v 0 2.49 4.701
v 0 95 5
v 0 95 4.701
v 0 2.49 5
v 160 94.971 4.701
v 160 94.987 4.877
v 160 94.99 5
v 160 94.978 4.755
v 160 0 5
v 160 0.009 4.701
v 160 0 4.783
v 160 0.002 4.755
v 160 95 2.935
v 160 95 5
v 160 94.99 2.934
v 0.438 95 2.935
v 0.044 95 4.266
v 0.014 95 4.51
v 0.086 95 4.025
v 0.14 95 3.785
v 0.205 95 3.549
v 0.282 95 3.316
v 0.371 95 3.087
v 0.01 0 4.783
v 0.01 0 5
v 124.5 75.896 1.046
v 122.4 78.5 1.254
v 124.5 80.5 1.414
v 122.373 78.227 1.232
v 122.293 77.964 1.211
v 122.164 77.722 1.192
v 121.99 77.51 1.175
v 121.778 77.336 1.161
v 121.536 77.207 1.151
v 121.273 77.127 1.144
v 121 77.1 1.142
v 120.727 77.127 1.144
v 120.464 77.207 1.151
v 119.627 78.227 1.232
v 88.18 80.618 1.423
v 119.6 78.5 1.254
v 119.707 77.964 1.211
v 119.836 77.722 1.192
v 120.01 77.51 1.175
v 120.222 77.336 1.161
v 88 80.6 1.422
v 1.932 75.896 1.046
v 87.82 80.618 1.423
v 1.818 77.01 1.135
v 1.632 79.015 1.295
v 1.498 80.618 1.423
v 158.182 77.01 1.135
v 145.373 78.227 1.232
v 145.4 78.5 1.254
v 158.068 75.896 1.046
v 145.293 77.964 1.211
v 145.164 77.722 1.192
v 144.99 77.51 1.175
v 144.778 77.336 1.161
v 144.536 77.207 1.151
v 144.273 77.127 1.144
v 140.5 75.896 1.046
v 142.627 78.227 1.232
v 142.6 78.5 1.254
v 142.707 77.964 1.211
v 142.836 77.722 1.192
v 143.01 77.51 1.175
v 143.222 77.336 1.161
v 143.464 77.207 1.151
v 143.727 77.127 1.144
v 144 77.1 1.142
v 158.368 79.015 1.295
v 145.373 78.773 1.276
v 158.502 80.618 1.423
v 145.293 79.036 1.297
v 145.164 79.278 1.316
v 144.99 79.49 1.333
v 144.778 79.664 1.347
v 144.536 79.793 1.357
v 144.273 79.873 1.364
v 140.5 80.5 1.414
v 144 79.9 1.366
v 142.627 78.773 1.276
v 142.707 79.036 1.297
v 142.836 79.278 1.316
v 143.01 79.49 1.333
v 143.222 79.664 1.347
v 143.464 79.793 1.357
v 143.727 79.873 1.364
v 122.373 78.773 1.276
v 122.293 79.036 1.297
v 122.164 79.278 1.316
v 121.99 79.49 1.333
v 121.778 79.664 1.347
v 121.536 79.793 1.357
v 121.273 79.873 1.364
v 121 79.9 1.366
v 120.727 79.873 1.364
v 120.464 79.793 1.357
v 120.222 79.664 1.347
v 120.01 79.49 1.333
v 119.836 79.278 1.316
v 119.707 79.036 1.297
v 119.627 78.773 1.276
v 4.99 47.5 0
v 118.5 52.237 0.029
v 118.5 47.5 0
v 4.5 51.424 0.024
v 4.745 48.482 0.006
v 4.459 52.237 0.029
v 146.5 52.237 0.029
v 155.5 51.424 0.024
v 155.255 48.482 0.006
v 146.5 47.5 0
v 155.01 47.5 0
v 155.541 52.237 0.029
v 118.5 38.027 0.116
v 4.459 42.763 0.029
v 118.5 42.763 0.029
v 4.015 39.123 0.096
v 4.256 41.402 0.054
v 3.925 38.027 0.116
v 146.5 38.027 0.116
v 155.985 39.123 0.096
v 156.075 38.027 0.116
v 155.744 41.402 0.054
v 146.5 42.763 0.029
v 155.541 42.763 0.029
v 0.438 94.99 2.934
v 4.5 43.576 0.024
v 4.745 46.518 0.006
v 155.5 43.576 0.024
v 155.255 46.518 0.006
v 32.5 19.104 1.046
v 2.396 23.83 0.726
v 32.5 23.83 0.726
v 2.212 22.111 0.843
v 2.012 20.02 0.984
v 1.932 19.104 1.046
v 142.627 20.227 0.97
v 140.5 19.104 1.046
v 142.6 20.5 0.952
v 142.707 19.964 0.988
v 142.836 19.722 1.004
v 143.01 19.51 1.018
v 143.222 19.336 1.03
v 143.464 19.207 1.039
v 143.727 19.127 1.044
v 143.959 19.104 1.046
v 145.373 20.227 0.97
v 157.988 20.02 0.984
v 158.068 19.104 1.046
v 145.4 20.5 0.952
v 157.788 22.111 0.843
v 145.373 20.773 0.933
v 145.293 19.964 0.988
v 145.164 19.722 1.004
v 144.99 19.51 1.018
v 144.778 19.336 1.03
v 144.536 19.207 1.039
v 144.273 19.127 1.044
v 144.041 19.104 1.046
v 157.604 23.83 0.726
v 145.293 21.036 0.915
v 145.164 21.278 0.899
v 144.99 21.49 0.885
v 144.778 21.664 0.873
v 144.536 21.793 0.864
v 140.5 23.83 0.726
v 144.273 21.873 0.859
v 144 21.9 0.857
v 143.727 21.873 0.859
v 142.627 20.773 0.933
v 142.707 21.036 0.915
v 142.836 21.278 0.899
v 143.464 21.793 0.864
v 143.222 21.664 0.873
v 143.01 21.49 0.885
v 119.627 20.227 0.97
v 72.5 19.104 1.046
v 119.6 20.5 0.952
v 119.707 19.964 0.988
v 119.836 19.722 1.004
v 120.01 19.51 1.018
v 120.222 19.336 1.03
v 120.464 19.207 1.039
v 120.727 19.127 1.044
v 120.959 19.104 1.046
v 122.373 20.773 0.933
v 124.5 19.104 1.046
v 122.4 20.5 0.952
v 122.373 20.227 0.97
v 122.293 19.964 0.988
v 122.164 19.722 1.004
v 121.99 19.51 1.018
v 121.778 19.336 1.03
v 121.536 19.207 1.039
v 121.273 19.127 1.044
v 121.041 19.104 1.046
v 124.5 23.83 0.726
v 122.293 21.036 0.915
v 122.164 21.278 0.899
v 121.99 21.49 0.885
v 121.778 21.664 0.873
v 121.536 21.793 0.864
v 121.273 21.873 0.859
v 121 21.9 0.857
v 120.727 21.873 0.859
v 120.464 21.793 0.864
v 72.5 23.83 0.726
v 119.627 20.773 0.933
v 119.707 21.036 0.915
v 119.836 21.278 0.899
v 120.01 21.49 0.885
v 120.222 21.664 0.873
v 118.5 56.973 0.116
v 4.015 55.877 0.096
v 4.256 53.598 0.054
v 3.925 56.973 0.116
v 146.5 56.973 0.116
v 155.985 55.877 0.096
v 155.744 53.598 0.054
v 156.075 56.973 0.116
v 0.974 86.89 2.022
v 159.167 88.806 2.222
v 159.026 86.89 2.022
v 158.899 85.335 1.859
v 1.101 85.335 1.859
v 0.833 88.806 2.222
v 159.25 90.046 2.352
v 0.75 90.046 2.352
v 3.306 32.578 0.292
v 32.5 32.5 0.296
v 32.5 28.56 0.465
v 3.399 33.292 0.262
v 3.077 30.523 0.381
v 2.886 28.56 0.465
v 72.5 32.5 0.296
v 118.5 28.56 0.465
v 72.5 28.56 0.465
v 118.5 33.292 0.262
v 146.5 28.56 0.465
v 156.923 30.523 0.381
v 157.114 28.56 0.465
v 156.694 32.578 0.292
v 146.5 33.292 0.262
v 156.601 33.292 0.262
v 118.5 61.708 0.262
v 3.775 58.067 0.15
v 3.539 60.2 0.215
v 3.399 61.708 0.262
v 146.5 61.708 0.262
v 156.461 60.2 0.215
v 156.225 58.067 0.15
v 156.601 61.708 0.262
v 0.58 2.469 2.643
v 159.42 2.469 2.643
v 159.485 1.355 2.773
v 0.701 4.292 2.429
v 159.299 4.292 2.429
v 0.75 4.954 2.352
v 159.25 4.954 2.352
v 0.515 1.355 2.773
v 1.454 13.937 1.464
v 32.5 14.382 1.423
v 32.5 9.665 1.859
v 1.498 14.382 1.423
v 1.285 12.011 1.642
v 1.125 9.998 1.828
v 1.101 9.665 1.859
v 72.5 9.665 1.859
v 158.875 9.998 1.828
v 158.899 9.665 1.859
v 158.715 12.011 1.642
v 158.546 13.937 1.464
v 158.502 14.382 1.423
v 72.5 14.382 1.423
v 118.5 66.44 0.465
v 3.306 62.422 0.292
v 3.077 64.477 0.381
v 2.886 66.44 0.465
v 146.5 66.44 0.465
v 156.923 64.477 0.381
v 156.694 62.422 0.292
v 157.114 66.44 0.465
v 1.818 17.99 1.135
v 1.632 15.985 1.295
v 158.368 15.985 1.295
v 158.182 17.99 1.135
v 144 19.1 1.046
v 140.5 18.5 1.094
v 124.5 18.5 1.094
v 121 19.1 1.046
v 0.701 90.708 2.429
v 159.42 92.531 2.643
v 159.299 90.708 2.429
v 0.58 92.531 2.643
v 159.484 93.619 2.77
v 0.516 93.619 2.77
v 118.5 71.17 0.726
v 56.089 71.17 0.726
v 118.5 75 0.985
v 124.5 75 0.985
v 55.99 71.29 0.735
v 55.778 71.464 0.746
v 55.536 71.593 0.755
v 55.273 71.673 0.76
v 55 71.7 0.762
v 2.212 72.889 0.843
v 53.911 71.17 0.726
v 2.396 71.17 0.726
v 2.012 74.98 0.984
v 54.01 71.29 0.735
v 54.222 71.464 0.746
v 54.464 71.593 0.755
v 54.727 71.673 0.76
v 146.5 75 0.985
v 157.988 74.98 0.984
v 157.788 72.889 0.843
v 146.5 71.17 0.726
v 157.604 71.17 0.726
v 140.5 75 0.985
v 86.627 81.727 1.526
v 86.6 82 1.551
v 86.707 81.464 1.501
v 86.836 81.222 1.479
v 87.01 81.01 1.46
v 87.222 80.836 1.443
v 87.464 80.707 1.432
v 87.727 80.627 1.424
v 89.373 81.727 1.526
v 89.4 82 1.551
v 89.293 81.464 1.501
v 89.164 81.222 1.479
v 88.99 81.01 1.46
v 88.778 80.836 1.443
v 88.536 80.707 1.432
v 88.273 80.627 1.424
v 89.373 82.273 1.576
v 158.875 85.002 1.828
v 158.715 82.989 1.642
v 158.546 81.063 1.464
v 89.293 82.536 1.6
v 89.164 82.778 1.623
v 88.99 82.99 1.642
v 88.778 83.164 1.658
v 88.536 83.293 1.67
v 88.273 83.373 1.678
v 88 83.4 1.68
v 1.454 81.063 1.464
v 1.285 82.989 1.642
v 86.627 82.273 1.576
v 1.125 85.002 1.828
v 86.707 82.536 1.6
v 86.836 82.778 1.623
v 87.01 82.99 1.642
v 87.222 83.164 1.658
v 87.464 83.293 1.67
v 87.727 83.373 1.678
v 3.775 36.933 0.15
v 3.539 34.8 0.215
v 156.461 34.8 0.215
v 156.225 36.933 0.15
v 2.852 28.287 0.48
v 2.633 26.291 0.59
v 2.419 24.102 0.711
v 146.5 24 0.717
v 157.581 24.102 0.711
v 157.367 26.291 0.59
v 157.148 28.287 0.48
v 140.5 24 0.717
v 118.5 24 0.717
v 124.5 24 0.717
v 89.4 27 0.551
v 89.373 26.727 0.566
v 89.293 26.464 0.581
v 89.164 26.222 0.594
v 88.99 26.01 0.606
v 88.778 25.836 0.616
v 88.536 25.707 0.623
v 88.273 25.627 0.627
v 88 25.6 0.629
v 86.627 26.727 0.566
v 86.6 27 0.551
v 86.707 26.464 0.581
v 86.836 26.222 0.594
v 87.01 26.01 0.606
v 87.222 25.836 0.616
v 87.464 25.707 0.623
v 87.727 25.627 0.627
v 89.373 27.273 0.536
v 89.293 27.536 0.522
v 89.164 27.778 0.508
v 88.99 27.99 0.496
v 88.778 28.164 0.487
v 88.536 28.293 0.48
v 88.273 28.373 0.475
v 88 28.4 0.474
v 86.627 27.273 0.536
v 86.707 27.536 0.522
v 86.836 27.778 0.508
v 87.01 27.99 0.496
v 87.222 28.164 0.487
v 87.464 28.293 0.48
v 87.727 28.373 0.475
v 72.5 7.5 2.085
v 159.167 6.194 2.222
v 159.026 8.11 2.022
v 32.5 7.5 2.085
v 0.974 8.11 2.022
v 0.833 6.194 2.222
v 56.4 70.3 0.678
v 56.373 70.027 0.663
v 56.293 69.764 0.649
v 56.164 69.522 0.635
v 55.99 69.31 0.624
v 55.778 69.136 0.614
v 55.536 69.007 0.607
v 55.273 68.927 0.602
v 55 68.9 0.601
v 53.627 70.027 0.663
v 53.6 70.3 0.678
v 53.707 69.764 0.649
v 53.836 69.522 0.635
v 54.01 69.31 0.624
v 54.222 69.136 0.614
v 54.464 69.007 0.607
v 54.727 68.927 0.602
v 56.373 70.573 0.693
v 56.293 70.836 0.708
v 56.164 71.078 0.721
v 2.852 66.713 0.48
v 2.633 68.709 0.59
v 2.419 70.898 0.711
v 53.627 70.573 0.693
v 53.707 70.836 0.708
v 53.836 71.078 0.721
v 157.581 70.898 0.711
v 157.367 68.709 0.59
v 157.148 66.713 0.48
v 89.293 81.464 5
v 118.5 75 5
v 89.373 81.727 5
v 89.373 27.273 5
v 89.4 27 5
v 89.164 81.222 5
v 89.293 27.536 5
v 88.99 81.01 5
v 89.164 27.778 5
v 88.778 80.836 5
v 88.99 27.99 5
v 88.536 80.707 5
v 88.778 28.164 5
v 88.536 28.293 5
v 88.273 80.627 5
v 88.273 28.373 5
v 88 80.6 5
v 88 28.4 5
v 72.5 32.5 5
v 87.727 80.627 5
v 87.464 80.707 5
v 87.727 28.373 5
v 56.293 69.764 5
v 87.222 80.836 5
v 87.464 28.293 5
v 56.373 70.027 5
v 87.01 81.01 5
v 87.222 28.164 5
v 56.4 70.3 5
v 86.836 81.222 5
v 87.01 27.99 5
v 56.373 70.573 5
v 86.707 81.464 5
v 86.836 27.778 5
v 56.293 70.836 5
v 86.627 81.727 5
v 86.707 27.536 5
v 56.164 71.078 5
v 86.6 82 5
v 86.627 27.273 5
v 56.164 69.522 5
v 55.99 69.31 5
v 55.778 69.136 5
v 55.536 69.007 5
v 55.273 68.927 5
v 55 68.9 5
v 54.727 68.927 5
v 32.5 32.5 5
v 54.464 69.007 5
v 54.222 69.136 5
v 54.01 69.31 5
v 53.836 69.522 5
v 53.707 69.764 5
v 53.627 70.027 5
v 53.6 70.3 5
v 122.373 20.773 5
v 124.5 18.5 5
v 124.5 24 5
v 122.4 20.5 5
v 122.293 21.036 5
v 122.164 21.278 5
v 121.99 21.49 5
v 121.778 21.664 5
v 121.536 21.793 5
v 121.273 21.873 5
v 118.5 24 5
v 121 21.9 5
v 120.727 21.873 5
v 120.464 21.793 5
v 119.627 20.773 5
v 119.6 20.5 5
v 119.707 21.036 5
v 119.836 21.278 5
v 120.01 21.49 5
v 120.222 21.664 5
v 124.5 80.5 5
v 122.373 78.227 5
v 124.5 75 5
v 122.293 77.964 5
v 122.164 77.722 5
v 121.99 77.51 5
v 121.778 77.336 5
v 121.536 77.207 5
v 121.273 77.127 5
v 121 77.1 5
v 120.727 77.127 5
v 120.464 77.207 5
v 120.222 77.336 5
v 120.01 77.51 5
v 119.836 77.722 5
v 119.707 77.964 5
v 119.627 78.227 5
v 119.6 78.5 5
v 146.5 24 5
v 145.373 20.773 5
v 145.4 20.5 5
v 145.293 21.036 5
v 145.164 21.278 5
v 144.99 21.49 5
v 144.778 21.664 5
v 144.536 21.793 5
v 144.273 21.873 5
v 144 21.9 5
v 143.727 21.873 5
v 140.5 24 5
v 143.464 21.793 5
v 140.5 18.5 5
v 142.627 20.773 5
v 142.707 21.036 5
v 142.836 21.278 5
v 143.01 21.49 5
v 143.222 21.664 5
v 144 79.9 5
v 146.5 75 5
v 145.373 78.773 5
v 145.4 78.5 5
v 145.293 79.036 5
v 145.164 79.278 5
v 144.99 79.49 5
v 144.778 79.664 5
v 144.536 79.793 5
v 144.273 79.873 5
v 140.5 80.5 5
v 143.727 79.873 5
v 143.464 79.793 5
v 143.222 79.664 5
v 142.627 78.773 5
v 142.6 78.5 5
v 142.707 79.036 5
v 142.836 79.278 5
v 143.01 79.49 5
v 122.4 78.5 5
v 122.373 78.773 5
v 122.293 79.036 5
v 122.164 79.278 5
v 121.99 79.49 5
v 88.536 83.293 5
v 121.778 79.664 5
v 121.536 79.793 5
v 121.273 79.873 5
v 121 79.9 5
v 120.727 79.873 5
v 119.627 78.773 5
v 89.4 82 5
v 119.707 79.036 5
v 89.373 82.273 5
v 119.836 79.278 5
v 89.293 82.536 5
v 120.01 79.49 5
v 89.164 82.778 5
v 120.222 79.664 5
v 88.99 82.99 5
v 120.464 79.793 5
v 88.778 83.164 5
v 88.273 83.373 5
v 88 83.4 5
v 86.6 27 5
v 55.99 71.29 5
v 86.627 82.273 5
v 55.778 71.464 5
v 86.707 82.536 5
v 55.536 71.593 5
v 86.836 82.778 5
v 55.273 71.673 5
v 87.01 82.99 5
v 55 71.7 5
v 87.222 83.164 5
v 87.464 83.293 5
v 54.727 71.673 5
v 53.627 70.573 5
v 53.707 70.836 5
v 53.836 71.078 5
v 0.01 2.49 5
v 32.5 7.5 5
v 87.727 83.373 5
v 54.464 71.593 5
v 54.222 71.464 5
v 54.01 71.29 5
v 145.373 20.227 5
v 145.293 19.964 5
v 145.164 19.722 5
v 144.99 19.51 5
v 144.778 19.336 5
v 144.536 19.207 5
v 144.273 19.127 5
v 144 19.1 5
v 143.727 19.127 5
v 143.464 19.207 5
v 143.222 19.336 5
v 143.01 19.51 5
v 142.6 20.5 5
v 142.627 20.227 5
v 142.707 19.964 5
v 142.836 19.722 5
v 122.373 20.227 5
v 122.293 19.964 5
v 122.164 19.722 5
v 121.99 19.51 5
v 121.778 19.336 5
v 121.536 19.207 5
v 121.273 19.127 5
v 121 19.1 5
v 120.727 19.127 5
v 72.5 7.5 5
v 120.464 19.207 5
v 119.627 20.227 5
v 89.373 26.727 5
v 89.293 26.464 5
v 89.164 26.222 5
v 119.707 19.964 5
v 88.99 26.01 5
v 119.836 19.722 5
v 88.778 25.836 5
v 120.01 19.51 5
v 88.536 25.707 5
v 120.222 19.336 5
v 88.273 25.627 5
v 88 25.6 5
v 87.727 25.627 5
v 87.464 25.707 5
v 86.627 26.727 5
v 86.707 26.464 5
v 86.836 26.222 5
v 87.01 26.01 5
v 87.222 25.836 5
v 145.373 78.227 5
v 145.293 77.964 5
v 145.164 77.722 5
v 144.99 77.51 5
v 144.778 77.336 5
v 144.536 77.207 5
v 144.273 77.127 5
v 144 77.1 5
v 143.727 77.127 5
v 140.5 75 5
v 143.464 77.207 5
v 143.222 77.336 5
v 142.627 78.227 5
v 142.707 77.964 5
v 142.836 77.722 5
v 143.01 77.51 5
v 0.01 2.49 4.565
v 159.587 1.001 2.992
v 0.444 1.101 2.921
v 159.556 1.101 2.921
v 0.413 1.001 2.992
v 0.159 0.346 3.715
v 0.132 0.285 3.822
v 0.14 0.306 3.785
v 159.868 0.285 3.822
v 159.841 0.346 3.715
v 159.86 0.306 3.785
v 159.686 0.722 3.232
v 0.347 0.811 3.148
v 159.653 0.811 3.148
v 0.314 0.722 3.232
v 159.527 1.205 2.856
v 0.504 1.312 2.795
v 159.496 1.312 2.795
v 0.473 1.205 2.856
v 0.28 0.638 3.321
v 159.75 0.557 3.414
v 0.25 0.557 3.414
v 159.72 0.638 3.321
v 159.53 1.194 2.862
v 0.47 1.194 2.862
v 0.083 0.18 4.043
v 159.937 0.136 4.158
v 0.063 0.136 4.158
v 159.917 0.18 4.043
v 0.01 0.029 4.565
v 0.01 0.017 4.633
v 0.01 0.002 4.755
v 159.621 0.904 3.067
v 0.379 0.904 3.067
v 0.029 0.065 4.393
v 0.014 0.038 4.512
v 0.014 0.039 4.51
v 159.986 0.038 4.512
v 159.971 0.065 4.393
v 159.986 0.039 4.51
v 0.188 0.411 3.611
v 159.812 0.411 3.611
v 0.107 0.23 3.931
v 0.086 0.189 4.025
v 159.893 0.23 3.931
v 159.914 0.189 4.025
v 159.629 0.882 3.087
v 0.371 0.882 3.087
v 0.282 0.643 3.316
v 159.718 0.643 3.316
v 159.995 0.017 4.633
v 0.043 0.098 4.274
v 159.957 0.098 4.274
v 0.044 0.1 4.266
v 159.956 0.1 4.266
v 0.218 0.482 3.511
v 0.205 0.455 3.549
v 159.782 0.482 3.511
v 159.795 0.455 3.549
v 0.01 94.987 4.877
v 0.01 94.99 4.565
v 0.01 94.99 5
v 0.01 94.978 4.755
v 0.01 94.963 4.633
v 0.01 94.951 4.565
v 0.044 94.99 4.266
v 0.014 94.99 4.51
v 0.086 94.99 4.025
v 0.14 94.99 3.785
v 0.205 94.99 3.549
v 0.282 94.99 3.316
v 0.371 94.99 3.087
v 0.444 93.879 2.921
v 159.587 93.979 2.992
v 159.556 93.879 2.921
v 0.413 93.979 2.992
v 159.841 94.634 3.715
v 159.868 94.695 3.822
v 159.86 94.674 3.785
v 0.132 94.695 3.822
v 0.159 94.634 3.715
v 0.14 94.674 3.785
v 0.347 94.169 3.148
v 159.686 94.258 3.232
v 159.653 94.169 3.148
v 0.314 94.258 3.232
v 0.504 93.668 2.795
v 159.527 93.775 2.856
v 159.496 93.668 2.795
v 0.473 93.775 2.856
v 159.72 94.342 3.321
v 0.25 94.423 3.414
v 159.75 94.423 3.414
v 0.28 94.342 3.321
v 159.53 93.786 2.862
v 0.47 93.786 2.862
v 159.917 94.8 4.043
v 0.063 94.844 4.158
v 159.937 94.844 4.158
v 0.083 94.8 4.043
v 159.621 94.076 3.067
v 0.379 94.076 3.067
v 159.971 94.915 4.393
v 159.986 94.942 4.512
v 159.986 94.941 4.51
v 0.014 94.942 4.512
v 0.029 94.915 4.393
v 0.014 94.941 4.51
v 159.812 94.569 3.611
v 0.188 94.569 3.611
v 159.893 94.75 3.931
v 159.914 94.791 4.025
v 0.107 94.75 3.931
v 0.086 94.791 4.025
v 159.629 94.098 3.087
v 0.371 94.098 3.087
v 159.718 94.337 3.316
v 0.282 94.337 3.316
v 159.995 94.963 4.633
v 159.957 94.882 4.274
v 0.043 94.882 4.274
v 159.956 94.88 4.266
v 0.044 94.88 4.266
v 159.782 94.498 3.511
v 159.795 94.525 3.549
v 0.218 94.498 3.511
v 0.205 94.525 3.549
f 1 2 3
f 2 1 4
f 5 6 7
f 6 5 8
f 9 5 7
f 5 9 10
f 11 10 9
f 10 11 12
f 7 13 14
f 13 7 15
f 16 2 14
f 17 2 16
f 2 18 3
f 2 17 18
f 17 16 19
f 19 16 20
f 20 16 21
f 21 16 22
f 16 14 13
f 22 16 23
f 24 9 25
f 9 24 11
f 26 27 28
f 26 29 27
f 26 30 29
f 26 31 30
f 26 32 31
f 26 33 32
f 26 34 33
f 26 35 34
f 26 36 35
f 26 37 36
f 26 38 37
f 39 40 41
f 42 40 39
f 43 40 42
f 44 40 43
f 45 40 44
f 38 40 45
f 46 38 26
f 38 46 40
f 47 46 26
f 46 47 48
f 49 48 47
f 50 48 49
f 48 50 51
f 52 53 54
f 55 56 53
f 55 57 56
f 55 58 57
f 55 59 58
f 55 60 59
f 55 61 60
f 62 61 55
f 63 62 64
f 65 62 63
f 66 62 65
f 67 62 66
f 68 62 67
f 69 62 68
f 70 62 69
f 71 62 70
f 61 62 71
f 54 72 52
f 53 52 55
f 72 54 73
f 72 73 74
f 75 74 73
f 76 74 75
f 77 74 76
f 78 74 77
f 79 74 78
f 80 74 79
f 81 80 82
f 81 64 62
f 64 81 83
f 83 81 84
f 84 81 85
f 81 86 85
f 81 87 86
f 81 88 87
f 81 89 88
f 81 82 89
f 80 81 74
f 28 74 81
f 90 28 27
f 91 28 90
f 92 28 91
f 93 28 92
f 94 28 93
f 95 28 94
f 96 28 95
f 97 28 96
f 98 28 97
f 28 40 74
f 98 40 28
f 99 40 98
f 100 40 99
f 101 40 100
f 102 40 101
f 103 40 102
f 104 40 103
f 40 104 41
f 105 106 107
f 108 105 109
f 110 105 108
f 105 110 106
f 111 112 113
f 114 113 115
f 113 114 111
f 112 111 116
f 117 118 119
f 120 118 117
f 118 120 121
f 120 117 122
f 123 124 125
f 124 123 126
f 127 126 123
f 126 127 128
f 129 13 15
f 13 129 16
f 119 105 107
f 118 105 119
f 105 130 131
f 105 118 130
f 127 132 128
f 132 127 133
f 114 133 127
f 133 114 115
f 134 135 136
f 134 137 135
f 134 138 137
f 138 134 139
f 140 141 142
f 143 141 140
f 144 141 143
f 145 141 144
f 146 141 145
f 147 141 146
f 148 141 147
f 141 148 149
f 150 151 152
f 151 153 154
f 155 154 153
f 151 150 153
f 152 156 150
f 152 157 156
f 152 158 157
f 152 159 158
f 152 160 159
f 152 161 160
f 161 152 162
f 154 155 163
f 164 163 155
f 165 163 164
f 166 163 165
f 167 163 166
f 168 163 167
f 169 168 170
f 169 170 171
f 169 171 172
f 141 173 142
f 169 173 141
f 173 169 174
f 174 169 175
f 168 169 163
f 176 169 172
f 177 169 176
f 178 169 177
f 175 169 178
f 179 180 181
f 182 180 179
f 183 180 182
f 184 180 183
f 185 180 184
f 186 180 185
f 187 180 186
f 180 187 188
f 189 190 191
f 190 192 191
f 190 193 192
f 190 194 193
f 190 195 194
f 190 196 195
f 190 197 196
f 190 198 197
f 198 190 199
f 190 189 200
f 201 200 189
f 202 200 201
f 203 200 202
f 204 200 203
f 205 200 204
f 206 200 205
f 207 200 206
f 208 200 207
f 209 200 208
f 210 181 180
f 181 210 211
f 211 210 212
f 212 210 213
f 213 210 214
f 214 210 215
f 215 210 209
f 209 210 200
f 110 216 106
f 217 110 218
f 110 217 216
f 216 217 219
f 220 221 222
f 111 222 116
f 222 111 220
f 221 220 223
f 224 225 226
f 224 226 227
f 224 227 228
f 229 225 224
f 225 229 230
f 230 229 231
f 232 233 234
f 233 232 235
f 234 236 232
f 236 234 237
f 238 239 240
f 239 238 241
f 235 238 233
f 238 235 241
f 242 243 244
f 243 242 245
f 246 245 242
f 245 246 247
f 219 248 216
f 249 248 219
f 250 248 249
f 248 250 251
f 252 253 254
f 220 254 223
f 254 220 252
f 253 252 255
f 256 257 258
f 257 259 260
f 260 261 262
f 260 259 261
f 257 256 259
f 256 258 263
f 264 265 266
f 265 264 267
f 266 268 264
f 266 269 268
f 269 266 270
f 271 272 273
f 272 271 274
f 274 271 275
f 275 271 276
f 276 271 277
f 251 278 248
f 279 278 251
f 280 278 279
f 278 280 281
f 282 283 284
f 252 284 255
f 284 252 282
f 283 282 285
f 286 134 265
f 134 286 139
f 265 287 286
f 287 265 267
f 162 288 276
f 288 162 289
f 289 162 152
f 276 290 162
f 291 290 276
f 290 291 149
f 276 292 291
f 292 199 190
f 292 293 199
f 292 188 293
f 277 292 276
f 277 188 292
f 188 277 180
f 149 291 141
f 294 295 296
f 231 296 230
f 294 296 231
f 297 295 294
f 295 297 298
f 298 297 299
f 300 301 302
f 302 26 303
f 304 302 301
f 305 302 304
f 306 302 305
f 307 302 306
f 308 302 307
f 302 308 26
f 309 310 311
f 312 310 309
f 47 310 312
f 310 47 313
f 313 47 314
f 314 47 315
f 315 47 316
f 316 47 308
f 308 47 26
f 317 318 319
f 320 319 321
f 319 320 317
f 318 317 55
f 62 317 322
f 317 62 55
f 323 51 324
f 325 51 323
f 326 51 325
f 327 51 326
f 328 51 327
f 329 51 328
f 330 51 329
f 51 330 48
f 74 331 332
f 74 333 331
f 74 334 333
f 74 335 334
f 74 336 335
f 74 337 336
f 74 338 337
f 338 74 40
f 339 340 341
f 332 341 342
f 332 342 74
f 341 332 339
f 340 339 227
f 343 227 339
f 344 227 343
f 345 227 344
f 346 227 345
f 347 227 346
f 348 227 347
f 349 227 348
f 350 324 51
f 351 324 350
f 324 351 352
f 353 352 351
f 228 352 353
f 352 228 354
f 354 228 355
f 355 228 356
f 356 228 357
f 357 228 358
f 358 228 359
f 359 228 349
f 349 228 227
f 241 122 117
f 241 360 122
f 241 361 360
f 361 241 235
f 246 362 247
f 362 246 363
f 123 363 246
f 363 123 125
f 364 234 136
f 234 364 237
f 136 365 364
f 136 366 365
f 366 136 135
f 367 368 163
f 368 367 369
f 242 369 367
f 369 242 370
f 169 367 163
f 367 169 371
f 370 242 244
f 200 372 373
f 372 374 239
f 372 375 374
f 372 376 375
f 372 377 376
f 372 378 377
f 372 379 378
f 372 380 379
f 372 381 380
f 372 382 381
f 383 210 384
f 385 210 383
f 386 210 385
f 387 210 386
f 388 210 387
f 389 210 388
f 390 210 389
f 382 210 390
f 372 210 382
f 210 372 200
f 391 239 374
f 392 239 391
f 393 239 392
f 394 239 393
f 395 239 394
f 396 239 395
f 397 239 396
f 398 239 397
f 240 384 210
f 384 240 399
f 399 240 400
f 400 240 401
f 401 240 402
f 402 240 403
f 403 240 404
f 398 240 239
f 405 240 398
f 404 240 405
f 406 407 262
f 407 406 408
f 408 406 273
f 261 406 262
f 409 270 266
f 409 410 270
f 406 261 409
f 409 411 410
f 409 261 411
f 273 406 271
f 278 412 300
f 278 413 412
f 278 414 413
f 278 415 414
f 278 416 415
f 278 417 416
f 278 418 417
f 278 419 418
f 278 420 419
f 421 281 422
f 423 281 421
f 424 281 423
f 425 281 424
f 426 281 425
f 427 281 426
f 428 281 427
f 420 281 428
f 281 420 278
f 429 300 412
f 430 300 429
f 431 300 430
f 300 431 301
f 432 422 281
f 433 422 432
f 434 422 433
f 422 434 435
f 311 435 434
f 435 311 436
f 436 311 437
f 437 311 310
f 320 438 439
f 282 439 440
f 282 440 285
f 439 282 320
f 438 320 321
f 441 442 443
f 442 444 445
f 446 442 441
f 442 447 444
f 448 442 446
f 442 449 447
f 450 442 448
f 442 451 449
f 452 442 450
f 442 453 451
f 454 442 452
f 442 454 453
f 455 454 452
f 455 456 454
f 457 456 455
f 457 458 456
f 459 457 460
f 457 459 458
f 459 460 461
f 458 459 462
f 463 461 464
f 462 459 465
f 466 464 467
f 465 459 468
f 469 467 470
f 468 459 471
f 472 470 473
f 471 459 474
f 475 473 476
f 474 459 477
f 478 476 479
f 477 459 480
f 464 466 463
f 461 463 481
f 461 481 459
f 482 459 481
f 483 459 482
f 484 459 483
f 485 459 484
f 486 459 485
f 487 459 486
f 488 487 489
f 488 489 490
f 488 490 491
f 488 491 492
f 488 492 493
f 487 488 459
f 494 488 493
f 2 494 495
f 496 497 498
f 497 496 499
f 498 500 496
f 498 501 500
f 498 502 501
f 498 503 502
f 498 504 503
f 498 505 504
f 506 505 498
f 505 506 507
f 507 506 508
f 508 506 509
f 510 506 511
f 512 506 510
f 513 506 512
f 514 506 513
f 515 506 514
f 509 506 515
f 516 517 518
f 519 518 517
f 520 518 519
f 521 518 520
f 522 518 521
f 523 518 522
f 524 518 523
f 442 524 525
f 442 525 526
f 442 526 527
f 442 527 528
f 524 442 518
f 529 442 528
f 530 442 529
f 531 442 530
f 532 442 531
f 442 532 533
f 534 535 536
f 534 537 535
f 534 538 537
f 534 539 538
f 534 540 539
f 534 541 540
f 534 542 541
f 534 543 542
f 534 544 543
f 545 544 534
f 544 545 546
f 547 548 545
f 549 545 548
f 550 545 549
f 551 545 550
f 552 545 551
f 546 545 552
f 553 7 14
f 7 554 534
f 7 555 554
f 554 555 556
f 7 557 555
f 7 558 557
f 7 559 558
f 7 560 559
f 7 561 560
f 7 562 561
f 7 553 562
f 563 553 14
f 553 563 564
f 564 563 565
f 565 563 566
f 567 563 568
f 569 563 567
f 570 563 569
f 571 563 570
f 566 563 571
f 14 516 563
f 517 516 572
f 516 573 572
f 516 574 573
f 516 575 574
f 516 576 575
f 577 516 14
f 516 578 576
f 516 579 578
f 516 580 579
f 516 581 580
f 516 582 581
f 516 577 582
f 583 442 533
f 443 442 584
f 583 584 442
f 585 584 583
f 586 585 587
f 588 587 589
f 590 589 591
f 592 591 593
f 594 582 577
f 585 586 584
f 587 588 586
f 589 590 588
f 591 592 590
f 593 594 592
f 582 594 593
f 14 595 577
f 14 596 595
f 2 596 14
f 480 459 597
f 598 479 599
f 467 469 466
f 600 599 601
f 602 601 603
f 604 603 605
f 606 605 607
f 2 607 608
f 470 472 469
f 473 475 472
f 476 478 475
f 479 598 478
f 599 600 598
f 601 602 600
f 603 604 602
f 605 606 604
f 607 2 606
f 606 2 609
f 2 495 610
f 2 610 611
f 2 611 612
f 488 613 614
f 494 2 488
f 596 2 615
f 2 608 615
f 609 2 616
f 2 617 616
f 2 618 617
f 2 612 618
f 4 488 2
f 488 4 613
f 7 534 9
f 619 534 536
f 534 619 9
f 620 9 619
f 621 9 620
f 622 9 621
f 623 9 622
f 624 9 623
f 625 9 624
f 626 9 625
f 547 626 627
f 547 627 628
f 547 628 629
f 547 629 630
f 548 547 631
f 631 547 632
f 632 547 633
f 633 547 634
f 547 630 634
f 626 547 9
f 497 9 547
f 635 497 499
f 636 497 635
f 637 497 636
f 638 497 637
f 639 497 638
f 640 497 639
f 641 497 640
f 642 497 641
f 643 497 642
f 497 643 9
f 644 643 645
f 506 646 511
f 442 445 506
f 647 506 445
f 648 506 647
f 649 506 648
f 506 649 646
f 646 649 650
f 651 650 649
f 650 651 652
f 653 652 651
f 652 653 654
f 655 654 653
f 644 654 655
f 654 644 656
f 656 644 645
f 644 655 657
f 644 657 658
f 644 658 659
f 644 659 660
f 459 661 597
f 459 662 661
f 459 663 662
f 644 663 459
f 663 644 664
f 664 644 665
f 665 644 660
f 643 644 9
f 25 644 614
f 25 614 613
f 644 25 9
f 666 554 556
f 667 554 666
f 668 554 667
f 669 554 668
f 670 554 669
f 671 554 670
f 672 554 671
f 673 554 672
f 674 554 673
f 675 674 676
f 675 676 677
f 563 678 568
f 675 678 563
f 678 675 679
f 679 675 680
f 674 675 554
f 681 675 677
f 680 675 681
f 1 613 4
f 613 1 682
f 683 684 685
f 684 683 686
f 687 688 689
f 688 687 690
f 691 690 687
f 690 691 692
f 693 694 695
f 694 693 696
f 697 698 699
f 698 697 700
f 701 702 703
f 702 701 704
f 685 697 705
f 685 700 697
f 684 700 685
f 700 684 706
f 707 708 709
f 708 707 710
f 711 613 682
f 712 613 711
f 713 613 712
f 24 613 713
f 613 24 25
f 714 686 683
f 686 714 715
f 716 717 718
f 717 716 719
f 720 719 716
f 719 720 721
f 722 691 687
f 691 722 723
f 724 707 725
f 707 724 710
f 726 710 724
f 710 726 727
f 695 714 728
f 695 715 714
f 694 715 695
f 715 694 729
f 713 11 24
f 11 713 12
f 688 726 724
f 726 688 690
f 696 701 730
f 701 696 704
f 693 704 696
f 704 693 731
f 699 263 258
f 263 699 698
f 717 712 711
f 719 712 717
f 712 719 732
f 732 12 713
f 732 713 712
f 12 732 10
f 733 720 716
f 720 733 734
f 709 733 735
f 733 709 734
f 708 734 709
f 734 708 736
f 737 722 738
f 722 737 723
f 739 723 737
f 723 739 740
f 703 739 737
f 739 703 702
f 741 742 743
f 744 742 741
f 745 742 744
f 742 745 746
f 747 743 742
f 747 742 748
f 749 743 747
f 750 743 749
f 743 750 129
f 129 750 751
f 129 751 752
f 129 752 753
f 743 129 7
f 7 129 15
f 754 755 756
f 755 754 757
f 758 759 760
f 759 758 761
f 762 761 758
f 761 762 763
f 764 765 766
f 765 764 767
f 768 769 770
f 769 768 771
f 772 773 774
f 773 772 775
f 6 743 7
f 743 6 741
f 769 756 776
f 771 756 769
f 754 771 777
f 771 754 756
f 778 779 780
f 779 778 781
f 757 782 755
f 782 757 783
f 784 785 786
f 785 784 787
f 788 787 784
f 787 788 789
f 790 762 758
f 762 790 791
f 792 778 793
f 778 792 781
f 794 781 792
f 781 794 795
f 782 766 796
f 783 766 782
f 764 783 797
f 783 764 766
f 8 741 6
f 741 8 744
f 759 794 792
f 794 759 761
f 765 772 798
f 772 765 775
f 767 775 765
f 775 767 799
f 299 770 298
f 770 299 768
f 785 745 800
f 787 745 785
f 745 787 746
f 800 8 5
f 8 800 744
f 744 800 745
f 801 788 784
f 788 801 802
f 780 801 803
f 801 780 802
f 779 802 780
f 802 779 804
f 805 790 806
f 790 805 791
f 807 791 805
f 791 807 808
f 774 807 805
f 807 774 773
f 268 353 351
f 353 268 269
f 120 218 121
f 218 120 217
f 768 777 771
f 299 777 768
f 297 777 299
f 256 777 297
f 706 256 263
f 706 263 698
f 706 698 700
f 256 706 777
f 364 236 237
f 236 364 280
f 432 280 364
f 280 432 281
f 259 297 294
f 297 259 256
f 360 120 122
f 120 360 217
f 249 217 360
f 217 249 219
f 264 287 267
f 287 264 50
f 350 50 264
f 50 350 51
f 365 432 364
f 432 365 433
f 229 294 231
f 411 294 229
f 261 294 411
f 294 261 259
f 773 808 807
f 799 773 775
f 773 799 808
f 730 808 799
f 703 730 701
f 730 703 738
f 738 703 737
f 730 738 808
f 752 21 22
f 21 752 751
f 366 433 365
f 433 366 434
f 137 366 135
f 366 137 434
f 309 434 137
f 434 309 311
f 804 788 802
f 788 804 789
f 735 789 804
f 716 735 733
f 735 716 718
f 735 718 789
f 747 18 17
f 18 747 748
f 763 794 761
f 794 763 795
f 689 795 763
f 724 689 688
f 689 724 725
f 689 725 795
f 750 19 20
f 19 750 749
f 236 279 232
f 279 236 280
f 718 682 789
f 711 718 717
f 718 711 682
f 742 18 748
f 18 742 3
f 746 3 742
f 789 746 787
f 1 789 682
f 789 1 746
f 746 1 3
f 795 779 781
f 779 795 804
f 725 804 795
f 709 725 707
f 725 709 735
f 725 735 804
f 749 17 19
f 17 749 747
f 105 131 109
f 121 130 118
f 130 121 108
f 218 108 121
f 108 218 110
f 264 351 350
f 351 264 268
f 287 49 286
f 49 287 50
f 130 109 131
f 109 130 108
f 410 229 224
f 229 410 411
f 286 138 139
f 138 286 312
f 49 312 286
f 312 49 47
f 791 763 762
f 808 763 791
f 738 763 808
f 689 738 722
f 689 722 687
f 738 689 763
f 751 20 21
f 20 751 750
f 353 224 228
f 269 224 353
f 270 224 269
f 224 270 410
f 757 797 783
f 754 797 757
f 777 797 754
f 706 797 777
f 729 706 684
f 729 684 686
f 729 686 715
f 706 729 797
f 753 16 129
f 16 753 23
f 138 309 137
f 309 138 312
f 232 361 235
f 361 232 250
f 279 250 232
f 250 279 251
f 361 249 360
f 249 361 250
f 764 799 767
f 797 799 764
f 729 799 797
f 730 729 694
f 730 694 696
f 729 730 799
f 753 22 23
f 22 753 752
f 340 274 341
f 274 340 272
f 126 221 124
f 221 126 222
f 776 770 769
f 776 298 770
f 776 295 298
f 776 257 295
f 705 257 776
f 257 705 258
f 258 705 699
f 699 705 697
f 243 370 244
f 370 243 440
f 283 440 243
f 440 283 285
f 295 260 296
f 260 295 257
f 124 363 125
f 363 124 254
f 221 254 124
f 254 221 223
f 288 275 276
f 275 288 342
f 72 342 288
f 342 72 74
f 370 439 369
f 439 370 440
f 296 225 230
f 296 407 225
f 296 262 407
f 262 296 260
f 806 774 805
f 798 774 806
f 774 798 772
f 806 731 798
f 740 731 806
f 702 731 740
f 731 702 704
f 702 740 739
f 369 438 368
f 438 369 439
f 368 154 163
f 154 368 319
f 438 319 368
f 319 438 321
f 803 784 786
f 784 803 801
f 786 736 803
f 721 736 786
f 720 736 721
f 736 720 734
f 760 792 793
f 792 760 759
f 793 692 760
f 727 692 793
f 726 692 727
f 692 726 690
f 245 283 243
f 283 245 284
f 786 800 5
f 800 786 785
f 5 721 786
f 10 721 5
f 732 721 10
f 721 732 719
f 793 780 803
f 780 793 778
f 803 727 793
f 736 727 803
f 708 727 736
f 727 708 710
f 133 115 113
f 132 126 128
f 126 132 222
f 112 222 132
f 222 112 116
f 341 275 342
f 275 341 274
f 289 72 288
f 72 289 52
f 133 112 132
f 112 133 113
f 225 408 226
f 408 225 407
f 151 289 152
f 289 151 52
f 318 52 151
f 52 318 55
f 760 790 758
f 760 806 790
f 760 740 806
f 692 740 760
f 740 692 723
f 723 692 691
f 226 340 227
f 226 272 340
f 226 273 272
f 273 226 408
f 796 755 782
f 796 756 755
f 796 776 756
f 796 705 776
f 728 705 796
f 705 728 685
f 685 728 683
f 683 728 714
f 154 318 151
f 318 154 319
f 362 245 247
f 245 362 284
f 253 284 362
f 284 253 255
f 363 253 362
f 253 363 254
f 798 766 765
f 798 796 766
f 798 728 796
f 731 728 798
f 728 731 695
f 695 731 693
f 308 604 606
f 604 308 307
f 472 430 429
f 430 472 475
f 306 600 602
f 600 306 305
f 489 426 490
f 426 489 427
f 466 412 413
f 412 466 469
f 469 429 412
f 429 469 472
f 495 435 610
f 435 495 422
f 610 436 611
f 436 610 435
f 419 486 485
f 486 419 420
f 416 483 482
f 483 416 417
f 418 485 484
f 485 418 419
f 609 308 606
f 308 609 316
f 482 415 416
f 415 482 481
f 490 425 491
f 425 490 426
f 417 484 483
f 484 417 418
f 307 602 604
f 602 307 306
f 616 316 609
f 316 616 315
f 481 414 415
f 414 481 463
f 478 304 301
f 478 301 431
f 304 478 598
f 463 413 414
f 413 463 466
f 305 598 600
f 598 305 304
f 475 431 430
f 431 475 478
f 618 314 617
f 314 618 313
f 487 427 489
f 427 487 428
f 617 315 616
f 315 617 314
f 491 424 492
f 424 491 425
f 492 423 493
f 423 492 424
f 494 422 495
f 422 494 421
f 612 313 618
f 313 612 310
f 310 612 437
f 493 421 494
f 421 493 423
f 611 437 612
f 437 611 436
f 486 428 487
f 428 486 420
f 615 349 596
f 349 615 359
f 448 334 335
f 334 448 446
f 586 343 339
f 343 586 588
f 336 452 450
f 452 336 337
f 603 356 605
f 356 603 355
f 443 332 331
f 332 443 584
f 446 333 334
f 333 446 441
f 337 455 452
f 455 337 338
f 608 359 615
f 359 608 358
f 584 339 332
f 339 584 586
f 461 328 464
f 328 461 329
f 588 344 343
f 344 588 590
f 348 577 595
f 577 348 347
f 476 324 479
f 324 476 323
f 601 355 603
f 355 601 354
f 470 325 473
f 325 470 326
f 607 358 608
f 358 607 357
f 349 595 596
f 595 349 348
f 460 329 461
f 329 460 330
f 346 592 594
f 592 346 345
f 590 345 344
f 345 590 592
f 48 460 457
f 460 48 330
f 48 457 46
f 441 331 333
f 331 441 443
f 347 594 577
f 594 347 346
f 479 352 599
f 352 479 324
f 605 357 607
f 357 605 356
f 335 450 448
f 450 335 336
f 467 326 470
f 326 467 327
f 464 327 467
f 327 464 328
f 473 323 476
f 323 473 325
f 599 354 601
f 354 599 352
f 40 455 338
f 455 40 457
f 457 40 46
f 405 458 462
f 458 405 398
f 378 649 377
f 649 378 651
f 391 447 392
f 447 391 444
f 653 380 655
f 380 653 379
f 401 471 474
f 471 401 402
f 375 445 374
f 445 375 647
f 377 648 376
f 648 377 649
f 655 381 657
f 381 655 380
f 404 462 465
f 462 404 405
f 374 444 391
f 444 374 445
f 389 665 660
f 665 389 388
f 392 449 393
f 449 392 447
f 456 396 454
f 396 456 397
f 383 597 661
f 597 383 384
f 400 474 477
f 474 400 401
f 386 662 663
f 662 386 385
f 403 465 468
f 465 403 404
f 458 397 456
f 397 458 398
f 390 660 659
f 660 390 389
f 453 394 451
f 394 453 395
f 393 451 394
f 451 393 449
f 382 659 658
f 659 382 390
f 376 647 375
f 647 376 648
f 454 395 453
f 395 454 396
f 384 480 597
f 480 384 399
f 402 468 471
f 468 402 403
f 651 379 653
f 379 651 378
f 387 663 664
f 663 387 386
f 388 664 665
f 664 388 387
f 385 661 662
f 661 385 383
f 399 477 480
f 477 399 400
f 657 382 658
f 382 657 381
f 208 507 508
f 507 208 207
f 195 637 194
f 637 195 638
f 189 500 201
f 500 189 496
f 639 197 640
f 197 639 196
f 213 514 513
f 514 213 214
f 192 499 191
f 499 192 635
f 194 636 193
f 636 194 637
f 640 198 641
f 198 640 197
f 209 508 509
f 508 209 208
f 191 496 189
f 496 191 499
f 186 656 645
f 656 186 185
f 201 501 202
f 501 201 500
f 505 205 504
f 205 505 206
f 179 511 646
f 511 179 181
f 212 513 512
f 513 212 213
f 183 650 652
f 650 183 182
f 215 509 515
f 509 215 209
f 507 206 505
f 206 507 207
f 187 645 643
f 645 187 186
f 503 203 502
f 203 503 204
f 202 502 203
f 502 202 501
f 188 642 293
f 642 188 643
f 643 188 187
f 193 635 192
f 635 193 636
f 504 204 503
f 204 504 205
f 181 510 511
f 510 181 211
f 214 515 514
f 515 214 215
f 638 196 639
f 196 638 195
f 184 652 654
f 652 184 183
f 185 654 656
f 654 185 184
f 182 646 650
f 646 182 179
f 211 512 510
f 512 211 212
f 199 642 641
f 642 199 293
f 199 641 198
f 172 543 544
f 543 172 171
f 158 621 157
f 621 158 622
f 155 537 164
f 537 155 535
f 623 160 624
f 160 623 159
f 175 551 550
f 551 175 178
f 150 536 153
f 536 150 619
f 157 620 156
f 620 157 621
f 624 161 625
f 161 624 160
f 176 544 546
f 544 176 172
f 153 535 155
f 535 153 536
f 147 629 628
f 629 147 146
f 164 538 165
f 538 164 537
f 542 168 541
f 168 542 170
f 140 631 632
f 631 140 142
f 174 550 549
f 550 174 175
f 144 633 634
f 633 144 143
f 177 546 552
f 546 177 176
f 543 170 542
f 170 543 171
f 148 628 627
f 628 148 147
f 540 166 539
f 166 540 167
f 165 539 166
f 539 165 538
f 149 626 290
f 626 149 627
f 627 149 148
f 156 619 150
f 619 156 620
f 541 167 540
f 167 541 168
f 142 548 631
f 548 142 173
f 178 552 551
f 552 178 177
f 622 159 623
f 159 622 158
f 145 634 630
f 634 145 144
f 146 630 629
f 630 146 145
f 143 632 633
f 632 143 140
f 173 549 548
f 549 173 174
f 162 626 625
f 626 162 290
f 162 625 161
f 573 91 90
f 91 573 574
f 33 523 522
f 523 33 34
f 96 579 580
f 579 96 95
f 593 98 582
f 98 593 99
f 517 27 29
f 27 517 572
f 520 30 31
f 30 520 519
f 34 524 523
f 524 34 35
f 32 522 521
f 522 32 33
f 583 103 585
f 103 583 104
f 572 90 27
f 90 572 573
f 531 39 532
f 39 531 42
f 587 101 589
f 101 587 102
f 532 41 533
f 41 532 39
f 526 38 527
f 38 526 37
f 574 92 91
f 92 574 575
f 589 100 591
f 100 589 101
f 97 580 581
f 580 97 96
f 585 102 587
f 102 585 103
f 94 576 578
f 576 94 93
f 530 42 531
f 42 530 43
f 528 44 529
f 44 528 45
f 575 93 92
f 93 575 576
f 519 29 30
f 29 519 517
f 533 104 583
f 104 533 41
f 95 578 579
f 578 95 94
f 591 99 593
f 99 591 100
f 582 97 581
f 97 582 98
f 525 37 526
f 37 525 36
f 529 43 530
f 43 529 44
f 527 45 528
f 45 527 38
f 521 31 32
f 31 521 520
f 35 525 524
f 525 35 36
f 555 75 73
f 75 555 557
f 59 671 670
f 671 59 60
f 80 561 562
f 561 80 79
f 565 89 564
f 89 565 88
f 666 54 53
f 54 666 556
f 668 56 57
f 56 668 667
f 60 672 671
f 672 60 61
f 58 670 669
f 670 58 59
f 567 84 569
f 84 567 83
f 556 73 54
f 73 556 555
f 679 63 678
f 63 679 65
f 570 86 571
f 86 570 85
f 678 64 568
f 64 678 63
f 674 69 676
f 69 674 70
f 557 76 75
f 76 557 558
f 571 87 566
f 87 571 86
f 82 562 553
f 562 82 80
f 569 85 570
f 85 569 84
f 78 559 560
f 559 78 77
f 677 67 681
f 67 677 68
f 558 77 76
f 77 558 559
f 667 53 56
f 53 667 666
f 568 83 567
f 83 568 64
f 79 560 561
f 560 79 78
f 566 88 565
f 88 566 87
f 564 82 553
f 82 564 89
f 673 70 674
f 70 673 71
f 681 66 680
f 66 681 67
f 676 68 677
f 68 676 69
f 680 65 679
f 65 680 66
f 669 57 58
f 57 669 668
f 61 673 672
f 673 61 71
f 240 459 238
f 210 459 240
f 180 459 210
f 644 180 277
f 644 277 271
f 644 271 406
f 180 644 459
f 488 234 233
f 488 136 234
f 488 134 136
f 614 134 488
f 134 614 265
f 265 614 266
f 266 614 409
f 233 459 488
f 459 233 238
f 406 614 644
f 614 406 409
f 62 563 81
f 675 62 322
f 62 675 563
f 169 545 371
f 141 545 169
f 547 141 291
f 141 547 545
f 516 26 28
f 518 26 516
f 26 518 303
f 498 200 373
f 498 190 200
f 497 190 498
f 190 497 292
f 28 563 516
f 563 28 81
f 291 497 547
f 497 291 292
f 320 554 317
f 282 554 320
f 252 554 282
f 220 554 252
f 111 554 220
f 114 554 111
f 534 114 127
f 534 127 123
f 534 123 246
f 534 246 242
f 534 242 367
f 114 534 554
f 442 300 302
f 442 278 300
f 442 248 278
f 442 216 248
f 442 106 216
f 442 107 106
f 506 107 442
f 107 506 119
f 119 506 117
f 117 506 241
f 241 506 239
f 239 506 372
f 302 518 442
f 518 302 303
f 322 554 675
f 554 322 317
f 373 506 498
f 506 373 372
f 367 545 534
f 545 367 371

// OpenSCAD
controllerHolder();

module controllerHolder() {

    width = 160; // +2
    depth = 95;  // -1
    height = 2;
    curvature_height = 3;
    
    draw_pcb = false;
    
    pcb_offset = [55, 17, 5];

    translate(pcb_offset) {
        if (draw_pcb) {
        color([0.7, 0.7, 0.7]) translate([0, 0, 3]) import(file = "controller4.dxf");
        }
    }


    difference() {
        translate([width, 0, height+curvature_height]) rotate([0, 180, 0]) baseplate();
        
        translate(pcb_offset) {
            translate([0,   53.3,   -10]) pug();
            translate([33,  65,     -10]) pug();
            translate([33,  10,     -10]) pug();
            translate([66,  3.5,  -10]) pug();
            translate([89,  3.5,  -10]) pug();
            translate([66,  61.5, -10]) pug();
            translate([89,  61.5, -10]) pug();
        }
        
        // viewfinder cutout
        translate([32.5, 7.5, -1]) cube([40, 25, 10]);
    
        // pi cutout
        translate([124.5, 18.5, -1]) {
            cube([16, 62, 10]);    
        }
        translate([118.5, 24, -1]) {
            cube([28, 51, 10]);    
        }
        
//        // pressure cutouts
//        translate([width-1.6, 10, -1]) {
//            cube([0.8, depth-20, 10]);    
//        }
//        
//        translate([width-3.2, 10, -1]) {
//            cube([0.8, depth-20, 10]);    
//        }
    }
    


    // modules
    
    module baseplate() {
        
        rounding_diameter   = 5;
        rounding_diameter2  = 10;
        
        difference() {
            union() {
                intersection() {
                    diameter = 772;
                    offset = -diameter/2 + height + curvature_height;
                    
                    translate([0, 0, height]) cube([width, depth, curvature_height]);
                    translate([0, depth/2, offset]) rotate([0, 90, 0]) {
                        cylinder(h=width, d=diameter, $fn=512);
                    }
                }        
                translate([0, 0, 0]) cube([width, depth, height]);

            }
        
            translate([-0.01, -0.01, 0]) difference() {
                cube([width+0.02, rounding_diameter/2, rounding_diameter/2]);
                translate([0, rounding_diameter/2, 0]) rotate([0, 90, 0]) cylinder(h=width, d=rounding_diameter, $fn=128);
            }
            translate([width-0.01, depth-0.01, 0]) rotate([180, 180, 0]) difference() {
                cube([width+0.02, rounding_diameter/2, rounding_diameter/2]);
                translate([0, rounding_diameter/2, 0]) rotate([0, 90, 0]) cylinder(h=width, d=rounding_diameter, $fn=128);
            }
            translate([width+0.01, 0.01, 0]) rotate([0, 0, 90]) difference() {
                cube([depth+0.02, rounding_diameter2/2, rounding_diameter2/2]);
                translate([0, rounding_diameter2/2, 0]) rotate([0, 90, 0]) cylinder(h=width, d=rounding_diameter2, $fn=128);
            }
            translate([-0.01, depth-0.01, 0]) rotate([0, 0, 270]) difference() {
                cube([depth+0.02, rounding_diameter2/2, rounding_diameter2/2]);
                translate([0, rounding_diameter2/2, 0]) rotate([0, 90, 0]) cylinder(h=width, d=rounding_diameter2, $fn=128);
            }
        }
        
        
//                    translate([-0.01, -0.01, -1])           rotate([0, 0, 0]) cornercutout(10);
//                    translate([width+0.01, -0.01, -1])      rotate([0, 0, 90]) cornercutout(10);
//                    translate([width+0.01, depth+0.01, -1]) rotate([0, 0, 180]) cornercutout(10);
//                    translate([-0.01, depth+0.01, -1])      rotate([0, 0, 270]) cornercutout(10);
            
    }

    module pug() {
        cylinder(h=20, d=2.8, $fn=32);
    }

    module cornercutout(diameter) {
        difference() {
            cube([diameter, diameter, 10]);
            translate([diameter, diameter, 0]) cylinder(h=12, d=diameter*2);
        } 
    }
}
